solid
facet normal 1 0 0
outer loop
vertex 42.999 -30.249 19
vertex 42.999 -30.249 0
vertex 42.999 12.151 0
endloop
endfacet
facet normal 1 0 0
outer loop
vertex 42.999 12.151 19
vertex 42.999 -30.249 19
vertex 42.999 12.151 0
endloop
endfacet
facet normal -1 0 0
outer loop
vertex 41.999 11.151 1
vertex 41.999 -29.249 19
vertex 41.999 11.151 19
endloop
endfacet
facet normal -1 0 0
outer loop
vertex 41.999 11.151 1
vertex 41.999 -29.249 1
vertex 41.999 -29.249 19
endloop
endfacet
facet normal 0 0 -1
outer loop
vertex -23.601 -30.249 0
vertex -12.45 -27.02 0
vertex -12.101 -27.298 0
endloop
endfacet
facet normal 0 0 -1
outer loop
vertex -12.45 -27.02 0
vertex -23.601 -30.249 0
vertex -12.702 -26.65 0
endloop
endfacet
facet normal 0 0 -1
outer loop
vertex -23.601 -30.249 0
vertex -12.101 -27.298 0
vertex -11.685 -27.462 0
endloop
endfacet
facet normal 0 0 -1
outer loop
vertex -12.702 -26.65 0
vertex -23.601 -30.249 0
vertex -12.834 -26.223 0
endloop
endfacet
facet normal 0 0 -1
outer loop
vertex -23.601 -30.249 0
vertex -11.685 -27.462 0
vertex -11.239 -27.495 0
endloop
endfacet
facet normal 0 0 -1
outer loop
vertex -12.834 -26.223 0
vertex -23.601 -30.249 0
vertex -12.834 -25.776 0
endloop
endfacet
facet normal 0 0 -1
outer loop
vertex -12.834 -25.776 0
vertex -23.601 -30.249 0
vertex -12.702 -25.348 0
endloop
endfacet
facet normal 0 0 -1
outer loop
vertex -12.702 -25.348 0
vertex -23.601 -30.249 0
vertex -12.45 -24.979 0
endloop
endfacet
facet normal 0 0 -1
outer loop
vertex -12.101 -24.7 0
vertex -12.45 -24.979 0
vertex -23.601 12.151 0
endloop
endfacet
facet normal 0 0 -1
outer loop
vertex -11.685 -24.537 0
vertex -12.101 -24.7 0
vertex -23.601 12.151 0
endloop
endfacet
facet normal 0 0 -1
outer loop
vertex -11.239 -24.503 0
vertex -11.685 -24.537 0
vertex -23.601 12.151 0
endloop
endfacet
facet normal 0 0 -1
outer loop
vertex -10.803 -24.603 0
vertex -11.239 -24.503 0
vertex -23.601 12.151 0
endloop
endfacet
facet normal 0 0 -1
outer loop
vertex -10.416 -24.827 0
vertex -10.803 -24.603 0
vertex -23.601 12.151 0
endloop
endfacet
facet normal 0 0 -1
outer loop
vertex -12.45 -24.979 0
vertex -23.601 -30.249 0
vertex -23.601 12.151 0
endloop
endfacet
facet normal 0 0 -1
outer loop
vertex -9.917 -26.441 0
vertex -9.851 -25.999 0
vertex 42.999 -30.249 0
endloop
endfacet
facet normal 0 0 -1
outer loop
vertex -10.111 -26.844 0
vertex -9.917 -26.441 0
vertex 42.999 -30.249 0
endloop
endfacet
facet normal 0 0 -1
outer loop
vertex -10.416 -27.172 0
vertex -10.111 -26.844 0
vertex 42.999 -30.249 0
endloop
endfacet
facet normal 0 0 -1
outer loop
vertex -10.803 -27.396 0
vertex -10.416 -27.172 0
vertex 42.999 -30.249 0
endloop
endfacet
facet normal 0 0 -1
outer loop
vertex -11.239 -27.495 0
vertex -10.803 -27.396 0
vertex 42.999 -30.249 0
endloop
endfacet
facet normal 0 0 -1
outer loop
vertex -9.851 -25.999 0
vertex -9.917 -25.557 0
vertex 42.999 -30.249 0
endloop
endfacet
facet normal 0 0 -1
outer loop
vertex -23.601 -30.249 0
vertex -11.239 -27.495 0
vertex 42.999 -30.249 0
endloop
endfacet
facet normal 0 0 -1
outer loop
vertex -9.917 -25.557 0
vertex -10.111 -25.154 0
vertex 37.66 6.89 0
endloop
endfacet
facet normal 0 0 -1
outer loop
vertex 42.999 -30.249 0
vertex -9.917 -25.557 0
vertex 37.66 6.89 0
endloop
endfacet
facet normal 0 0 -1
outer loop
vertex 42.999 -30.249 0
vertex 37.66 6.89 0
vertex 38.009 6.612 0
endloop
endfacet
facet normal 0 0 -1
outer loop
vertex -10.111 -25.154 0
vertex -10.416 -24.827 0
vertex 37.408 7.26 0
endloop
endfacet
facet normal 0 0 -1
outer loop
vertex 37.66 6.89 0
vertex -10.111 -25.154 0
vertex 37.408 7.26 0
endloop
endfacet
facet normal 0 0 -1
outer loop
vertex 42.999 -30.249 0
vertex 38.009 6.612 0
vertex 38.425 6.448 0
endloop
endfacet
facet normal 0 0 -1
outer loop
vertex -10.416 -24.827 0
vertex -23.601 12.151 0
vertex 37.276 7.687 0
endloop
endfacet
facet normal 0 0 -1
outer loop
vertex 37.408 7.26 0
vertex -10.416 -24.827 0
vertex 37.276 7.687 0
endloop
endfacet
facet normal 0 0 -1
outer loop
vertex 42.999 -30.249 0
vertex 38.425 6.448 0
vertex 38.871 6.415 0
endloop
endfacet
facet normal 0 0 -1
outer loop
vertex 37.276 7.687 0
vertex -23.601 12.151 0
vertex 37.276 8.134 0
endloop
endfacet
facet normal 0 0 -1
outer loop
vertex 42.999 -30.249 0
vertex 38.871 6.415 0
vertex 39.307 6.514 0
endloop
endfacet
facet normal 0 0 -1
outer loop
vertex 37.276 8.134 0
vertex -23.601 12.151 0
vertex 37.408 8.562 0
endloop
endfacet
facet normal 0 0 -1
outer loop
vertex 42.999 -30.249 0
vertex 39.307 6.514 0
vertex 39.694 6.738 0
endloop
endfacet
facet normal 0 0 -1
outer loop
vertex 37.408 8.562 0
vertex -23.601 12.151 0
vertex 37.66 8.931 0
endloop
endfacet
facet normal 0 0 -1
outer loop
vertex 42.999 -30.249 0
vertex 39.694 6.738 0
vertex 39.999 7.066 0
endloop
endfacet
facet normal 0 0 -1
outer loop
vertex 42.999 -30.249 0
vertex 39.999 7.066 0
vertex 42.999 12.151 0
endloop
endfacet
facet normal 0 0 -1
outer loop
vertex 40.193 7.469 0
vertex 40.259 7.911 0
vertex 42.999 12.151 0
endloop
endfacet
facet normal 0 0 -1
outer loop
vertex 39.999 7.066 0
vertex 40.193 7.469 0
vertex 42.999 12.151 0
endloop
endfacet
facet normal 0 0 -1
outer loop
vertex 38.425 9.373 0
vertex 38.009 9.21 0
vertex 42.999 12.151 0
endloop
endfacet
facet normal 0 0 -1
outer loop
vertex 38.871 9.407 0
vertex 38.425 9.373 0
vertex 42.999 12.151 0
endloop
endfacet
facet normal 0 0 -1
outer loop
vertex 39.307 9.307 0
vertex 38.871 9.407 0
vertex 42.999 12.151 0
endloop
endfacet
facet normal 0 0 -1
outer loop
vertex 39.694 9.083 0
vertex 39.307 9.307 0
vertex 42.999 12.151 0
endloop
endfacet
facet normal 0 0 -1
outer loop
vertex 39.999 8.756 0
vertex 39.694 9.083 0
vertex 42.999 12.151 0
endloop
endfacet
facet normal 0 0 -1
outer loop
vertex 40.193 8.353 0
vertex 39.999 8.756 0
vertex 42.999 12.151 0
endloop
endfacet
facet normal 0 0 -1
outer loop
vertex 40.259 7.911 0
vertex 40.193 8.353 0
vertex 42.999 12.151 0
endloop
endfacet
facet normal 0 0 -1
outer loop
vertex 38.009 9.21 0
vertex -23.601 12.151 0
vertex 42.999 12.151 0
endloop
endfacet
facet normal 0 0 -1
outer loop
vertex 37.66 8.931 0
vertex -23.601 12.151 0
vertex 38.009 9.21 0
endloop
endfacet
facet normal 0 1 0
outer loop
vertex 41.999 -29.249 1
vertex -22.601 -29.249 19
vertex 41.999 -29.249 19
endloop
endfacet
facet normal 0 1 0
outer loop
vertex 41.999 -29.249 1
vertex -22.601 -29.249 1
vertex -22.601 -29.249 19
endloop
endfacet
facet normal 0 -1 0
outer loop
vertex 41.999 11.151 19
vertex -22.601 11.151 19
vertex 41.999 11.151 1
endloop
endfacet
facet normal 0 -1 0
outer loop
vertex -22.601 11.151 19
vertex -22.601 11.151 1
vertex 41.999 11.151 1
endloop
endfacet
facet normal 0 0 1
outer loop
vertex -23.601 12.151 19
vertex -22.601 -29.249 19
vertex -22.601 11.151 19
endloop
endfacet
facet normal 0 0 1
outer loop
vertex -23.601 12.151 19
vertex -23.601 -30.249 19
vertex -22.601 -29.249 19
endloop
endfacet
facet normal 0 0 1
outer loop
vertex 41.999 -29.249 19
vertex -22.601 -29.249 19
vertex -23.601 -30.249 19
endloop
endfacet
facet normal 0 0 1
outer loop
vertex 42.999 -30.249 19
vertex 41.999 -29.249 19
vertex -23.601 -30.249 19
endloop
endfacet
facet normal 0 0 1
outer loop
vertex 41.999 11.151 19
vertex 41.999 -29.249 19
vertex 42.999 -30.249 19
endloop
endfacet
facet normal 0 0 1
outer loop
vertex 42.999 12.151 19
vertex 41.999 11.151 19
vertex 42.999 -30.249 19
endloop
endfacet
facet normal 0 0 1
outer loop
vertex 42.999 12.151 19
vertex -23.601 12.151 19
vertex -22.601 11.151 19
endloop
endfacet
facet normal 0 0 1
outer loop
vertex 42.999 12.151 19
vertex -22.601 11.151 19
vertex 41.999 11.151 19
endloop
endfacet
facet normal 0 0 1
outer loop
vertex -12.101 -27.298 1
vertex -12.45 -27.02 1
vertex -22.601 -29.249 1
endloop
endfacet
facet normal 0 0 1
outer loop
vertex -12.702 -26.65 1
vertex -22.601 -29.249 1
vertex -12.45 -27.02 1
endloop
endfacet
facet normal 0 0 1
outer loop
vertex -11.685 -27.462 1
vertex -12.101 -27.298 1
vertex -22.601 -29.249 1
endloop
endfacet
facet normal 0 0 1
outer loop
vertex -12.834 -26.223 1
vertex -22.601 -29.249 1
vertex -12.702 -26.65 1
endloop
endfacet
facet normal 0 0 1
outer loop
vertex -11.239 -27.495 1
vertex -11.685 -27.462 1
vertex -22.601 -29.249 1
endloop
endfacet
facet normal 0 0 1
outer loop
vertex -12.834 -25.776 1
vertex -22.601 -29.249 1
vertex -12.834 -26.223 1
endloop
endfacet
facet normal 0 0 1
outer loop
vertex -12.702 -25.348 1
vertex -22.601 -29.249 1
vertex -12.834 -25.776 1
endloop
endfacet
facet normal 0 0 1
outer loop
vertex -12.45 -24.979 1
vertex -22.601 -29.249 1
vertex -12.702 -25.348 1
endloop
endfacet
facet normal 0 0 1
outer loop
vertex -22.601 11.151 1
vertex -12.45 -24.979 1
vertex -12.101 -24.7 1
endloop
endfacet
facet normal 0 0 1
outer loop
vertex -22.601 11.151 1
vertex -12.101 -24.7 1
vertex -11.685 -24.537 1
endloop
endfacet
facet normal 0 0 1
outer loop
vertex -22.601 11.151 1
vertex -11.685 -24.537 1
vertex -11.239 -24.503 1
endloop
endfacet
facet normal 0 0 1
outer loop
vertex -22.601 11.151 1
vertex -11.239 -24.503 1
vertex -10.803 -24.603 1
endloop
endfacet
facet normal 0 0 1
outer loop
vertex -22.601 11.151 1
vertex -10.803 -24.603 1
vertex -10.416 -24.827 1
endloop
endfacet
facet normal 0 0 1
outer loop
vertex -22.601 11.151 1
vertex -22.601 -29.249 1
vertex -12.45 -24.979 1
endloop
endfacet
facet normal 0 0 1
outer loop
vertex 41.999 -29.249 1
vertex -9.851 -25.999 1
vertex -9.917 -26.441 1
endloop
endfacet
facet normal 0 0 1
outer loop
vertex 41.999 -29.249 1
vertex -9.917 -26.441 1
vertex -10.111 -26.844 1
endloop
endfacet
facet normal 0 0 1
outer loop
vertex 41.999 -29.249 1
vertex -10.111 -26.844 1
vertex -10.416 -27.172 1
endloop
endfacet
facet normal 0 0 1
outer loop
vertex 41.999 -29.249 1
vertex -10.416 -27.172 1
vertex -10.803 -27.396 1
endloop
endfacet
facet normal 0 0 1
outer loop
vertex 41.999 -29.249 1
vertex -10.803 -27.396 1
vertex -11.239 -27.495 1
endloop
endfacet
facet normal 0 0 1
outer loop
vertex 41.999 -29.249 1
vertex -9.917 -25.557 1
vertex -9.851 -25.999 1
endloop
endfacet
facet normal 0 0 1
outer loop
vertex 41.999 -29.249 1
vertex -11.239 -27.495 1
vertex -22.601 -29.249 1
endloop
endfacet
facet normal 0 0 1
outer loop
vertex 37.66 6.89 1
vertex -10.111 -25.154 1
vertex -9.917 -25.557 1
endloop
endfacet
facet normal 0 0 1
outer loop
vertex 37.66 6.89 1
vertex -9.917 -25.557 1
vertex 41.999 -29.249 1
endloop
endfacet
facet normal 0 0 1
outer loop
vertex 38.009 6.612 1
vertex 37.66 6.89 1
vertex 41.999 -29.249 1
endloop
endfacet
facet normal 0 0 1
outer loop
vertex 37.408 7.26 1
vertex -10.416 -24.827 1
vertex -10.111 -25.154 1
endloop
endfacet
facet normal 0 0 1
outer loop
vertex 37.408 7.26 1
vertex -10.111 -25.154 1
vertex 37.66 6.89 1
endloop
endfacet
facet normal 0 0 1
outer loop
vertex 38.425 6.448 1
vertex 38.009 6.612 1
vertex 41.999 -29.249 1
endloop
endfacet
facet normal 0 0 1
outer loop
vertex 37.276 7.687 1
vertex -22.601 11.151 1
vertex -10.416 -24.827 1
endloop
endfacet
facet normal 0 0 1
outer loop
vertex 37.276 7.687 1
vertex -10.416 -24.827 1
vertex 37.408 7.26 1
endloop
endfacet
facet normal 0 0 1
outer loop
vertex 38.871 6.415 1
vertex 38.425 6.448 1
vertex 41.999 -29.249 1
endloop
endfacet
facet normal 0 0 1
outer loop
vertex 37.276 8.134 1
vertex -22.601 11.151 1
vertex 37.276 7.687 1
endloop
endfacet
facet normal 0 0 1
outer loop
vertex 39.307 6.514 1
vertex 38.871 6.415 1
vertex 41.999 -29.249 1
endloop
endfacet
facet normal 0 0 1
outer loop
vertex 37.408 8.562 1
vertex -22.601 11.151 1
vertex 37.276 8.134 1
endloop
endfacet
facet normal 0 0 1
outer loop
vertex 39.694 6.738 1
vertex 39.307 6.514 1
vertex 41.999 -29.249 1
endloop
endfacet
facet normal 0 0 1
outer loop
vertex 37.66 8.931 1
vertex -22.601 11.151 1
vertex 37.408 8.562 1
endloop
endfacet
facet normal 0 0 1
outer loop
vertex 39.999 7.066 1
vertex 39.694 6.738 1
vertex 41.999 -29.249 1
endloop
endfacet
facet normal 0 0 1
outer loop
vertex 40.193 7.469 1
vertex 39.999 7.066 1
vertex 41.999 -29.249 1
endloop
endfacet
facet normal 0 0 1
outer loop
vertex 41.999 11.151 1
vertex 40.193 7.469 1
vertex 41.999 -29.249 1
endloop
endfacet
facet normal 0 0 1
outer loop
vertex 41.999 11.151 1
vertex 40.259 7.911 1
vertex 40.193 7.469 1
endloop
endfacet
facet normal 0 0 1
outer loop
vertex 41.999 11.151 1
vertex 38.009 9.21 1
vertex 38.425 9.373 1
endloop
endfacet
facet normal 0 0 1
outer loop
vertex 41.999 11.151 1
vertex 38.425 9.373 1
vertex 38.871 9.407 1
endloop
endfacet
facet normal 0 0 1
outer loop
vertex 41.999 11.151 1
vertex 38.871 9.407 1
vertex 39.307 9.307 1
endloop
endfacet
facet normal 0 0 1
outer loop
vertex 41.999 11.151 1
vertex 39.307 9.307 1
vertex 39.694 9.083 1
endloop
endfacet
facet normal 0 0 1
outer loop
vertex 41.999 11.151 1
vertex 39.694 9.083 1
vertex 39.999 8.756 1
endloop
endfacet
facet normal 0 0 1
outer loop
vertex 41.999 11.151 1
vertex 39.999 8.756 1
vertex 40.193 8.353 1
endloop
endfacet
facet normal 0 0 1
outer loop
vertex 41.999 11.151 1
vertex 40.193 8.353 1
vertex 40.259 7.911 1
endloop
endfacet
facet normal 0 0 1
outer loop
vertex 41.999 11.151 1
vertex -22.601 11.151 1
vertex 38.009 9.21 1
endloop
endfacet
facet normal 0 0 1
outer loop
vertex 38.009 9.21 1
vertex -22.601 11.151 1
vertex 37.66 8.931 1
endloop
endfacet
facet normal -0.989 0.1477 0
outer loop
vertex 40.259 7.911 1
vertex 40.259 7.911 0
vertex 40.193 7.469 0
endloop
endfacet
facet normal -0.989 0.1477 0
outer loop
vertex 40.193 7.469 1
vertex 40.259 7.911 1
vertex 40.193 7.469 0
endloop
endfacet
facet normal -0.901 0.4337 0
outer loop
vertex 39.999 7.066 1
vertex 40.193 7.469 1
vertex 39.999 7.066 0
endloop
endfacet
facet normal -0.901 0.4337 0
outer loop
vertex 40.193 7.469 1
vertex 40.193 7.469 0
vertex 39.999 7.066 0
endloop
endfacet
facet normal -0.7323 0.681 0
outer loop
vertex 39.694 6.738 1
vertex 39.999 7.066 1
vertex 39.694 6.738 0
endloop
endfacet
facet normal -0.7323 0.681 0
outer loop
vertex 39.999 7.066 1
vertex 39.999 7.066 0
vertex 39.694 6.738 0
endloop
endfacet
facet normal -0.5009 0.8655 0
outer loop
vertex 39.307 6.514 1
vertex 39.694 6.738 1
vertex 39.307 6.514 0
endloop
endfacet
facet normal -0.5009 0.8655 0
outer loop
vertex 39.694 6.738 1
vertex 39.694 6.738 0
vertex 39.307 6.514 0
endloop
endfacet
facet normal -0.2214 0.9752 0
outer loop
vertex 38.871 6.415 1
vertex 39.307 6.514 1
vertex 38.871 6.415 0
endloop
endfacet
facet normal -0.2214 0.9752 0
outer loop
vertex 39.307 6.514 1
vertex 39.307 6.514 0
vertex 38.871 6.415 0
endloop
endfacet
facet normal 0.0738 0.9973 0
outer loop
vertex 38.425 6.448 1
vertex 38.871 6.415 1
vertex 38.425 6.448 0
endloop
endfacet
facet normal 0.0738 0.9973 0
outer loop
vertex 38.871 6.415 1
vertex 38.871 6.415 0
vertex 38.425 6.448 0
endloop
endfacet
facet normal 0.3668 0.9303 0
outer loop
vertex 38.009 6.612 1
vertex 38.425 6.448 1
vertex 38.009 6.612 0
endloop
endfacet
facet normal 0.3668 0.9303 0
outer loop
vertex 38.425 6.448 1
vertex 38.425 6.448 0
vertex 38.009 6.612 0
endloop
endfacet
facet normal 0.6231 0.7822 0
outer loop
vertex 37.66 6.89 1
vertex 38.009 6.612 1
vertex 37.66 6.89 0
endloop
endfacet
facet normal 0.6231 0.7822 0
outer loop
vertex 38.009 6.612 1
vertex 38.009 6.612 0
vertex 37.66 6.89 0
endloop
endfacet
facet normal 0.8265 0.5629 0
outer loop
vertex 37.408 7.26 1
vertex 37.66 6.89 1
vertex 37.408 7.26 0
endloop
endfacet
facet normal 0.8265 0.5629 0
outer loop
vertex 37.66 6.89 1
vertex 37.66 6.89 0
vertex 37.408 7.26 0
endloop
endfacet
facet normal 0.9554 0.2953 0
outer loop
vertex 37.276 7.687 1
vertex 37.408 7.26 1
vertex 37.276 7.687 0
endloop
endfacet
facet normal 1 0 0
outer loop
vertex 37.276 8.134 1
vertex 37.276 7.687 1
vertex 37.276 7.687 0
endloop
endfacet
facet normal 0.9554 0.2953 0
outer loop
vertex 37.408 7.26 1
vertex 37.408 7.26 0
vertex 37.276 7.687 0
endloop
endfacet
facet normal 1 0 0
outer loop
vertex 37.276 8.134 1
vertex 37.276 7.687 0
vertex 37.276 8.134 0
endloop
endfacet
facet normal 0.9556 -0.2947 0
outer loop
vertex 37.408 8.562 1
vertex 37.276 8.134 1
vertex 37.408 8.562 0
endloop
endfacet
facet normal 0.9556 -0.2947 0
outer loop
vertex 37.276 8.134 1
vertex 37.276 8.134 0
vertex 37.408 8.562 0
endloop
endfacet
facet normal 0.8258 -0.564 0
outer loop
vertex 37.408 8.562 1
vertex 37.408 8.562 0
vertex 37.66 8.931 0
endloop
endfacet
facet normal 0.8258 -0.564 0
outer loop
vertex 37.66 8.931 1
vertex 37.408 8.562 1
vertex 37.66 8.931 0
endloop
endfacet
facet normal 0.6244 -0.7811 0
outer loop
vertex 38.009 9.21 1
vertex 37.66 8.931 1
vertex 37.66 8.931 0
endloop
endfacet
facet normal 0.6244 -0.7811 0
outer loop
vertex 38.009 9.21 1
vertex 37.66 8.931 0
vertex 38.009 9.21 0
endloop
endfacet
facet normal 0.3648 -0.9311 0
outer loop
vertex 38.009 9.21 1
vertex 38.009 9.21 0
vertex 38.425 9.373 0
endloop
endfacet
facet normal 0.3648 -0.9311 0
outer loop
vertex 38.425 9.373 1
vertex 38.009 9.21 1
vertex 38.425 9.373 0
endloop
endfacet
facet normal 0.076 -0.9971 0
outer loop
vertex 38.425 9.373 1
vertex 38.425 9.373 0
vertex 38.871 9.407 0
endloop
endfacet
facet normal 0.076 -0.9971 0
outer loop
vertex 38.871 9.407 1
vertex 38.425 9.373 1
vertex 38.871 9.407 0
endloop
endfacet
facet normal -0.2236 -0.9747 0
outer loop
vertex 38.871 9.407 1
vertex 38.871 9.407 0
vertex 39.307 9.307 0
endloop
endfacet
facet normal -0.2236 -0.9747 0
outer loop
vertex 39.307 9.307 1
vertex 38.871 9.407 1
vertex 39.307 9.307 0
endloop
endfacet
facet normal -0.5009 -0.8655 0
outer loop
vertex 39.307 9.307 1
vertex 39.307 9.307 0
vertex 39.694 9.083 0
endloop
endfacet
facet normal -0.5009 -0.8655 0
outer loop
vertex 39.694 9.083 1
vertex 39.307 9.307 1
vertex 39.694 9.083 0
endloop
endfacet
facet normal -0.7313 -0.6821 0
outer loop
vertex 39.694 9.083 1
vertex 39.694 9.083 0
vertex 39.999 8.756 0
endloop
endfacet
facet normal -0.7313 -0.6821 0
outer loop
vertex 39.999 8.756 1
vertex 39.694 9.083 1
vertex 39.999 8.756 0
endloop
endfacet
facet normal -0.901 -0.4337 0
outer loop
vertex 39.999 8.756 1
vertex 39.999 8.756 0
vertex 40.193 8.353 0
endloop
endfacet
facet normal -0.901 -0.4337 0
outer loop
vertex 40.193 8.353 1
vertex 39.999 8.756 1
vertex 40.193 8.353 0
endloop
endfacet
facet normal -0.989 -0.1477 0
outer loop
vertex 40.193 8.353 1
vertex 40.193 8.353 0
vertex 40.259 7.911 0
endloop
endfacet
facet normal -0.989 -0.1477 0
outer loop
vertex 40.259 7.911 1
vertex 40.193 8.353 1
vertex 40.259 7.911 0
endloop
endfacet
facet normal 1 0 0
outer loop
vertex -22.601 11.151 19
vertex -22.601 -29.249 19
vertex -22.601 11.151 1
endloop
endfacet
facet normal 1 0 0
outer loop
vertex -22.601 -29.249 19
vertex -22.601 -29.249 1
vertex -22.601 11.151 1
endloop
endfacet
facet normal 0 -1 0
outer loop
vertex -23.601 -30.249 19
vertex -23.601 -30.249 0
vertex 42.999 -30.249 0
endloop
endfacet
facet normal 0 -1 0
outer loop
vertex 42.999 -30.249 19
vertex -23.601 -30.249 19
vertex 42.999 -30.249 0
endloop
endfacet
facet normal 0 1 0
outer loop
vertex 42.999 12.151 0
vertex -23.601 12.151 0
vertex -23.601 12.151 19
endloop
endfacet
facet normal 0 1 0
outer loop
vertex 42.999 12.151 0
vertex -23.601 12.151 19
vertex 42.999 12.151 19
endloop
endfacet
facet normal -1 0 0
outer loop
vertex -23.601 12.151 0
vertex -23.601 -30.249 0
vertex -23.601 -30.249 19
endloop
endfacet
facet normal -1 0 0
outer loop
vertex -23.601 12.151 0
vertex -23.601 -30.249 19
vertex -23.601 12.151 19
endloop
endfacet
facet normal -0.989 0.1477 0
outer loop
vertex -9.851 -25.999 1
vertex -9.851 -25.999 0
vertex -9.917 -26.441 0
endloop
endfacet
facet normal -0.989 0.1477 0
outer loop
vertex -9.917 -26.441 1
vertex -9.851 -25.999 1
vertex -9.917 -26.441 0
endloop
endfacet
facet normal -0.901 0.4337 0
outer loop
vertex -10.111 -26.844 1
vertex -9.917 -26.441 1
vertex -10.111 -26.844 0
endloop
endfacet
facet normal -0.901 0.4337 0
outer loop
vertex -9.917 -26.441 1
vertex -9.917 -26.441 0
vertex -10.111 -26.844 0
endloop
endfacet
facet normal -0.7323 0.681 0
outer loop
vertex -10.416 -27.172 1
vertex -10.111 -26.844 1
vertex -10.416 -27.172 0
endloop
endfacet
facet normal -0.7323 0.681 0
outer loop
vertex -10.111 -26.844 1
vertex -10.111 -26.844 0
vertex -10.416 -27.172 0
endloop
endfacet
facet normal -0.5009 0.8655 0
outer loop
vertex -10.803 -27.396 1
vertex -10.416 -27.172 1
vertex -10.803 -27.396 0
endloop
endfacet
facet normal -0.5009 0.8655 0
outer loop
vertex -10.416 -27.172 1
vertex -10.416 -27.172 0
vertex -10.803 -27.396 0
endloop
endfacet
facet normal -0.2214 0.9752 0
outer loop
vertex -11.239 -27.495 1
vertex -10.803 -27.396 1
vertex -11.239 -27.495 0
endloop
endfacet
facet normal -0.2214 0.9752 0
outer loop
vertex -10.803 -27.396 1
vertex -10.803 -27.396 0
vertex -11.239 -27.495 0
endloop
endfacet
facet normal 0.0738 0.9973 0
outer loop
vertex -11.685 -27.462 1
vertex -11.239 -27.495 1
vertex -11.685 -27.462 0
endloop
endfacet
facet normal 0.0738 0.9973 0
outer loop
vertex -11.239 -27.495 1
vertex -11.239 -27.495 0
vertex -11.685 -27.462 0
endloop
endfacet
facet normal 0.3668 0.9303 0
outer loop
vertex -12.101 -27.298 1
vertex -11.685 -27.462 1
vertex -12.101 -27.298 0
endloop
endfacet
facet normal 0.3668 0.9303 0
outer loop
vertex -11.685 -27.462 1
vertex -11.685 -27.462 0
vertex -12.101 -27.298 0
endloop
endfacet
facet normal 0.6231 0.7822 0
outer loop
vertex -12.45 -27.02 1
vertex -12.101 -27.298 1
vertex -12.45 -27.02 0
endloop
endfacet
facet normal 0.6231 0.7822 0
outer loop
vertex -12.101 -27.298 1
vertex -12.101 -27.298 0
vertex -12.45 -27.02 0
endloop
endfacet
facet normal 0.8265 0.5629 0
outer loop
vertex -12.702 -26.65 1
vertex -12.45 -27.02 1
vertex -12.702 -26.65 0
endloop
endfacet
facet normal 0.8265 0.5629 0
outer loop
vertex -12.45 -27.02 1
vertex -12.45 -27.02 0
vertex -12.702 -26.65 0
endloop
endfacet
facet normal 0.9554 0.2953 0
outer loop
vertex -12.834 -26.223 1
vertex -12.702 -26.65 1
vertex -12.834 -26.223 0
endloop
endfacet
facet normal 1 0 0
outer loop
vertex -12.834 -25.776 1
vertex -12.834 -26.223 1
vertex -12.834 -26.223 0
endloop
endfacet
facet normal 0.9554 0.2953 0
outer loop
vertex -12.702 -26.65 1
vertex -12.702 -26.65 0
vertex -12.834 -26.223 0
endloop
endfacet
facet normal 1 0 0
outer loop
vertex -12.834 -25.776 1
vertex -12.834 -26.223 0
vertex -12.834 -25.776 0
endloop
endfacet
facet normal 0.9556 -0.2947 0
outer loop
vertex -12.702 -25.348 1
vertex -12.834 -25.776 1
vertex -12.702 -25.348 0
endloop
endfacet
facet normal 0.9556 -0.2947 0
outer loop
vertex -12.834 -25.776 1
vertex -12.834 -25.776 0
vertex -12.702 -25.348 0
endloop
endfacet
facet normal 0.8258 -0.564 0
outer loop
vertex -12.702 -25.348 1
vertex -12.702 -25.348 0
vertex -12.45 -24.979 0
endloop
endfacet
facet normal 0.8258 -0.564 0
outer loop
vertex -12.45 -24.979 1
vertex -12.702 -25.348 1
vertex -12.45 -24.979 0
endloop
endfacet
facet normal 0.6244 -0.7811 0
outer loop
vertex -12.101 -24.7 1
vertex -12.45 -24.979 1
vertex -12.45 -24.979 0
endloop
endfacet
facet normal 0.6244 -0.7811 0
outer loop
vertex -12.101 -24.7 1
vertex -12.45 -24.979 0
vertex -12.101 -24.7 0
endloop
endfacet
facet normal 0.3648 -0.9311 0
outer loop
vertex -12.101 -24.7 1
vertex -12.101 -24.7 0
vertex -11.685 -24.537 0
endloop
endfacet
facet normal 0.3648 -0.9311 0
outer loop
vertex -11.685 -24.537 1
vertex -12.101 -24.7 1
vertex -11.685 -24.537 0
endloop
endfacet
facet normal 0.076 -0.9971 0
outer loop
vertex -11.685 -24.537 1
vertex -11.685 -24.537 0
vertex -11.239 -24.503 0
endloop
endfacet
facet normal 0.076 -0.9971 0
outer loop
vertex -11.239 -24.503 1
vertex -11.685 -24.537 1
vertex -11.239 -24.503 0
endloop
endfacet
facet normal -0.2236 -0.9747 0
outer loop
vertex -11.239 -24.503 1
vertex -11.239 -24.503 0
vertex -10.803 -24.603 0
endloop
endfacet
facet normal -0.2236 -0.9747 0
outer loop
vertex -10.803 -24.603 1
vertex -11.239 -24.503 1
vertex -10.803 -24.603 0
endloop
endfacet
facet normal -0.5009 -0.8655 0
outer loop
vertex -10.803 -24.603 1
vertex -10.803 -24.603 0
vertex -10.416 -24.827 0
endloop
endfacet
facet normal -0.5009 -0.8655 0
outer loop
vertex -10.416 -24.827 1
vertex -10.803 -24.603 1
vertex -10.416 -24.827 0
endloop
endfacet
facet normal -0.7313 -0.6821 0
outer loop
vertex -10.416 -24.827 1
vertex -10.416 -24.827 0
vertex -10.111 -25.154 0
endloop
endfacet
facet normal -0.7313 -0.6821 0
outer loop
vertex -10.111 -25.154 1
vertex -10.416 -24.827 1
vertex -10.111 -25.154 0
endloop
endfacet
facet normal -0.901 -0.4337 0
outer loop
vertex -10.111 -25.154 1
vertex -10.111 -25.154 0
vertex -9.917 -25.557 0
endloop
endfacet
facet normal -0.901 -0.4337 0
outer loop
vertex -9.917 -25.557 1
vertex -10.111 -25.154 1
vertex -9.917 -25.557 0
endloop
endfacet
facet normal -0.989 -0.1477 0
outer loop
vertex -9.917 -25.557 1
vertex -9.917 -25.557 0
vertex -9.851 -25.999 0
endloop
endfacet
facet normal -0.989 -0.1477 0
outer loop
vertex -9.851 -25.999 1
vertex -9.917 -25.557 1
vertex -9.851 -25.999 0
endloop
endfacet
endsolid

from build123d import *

# Parameters (mm, degrees)
F0_W     = 66.6
F0_H     = 42.4
F1_DEPTH = 19
F2_T     = -1
F3_R     = 1.5
F4_DEPTH = 25
F5_R     = 1.5
F6_DEPTH = 25


with BuildPart() as f1:
    # F0 (on Top) → F1 (new body)
    with BuildSketch(Plane.XY):
        with Locations((9.69916, -9.049298)):
            Rectangle(F0_W, F0_H)
    extrude(amount=F1_DEPTH)

    # F2
    f2_openings = [f1.faces().sort_by_distance(p)[0] for p in [
        (9.69916, -9.049298, 19),
    ]]
    offset(amount=F2_T, openings=f2_openings)

    # F3 (on face) → F4 (cut)
    with BuildSketch(Plane(origin=(0, 0, 0), x_dir=(1, 0, 0), z_dir=(0, 0, -1))):
        with Locations((-11.35084, 25.999298)):
            Circle(F3_R)
    extrude(amount=-F4_DEPTH, mode=Mode.SUBTRACT)

    # F5 (on face) → F6 (cut)
    with BuildSketch(Plane(origin=(0, 0, 0), x_dir=(1, 0, 0), z_dir=(0, 0, -1))):
        with Locations((38.75916, -7.910702)):
            Circle(F5_R)
    extrude(amount=-F6_DEPTH, mode=Mode.SUBTRACT)


solid = f1.part
